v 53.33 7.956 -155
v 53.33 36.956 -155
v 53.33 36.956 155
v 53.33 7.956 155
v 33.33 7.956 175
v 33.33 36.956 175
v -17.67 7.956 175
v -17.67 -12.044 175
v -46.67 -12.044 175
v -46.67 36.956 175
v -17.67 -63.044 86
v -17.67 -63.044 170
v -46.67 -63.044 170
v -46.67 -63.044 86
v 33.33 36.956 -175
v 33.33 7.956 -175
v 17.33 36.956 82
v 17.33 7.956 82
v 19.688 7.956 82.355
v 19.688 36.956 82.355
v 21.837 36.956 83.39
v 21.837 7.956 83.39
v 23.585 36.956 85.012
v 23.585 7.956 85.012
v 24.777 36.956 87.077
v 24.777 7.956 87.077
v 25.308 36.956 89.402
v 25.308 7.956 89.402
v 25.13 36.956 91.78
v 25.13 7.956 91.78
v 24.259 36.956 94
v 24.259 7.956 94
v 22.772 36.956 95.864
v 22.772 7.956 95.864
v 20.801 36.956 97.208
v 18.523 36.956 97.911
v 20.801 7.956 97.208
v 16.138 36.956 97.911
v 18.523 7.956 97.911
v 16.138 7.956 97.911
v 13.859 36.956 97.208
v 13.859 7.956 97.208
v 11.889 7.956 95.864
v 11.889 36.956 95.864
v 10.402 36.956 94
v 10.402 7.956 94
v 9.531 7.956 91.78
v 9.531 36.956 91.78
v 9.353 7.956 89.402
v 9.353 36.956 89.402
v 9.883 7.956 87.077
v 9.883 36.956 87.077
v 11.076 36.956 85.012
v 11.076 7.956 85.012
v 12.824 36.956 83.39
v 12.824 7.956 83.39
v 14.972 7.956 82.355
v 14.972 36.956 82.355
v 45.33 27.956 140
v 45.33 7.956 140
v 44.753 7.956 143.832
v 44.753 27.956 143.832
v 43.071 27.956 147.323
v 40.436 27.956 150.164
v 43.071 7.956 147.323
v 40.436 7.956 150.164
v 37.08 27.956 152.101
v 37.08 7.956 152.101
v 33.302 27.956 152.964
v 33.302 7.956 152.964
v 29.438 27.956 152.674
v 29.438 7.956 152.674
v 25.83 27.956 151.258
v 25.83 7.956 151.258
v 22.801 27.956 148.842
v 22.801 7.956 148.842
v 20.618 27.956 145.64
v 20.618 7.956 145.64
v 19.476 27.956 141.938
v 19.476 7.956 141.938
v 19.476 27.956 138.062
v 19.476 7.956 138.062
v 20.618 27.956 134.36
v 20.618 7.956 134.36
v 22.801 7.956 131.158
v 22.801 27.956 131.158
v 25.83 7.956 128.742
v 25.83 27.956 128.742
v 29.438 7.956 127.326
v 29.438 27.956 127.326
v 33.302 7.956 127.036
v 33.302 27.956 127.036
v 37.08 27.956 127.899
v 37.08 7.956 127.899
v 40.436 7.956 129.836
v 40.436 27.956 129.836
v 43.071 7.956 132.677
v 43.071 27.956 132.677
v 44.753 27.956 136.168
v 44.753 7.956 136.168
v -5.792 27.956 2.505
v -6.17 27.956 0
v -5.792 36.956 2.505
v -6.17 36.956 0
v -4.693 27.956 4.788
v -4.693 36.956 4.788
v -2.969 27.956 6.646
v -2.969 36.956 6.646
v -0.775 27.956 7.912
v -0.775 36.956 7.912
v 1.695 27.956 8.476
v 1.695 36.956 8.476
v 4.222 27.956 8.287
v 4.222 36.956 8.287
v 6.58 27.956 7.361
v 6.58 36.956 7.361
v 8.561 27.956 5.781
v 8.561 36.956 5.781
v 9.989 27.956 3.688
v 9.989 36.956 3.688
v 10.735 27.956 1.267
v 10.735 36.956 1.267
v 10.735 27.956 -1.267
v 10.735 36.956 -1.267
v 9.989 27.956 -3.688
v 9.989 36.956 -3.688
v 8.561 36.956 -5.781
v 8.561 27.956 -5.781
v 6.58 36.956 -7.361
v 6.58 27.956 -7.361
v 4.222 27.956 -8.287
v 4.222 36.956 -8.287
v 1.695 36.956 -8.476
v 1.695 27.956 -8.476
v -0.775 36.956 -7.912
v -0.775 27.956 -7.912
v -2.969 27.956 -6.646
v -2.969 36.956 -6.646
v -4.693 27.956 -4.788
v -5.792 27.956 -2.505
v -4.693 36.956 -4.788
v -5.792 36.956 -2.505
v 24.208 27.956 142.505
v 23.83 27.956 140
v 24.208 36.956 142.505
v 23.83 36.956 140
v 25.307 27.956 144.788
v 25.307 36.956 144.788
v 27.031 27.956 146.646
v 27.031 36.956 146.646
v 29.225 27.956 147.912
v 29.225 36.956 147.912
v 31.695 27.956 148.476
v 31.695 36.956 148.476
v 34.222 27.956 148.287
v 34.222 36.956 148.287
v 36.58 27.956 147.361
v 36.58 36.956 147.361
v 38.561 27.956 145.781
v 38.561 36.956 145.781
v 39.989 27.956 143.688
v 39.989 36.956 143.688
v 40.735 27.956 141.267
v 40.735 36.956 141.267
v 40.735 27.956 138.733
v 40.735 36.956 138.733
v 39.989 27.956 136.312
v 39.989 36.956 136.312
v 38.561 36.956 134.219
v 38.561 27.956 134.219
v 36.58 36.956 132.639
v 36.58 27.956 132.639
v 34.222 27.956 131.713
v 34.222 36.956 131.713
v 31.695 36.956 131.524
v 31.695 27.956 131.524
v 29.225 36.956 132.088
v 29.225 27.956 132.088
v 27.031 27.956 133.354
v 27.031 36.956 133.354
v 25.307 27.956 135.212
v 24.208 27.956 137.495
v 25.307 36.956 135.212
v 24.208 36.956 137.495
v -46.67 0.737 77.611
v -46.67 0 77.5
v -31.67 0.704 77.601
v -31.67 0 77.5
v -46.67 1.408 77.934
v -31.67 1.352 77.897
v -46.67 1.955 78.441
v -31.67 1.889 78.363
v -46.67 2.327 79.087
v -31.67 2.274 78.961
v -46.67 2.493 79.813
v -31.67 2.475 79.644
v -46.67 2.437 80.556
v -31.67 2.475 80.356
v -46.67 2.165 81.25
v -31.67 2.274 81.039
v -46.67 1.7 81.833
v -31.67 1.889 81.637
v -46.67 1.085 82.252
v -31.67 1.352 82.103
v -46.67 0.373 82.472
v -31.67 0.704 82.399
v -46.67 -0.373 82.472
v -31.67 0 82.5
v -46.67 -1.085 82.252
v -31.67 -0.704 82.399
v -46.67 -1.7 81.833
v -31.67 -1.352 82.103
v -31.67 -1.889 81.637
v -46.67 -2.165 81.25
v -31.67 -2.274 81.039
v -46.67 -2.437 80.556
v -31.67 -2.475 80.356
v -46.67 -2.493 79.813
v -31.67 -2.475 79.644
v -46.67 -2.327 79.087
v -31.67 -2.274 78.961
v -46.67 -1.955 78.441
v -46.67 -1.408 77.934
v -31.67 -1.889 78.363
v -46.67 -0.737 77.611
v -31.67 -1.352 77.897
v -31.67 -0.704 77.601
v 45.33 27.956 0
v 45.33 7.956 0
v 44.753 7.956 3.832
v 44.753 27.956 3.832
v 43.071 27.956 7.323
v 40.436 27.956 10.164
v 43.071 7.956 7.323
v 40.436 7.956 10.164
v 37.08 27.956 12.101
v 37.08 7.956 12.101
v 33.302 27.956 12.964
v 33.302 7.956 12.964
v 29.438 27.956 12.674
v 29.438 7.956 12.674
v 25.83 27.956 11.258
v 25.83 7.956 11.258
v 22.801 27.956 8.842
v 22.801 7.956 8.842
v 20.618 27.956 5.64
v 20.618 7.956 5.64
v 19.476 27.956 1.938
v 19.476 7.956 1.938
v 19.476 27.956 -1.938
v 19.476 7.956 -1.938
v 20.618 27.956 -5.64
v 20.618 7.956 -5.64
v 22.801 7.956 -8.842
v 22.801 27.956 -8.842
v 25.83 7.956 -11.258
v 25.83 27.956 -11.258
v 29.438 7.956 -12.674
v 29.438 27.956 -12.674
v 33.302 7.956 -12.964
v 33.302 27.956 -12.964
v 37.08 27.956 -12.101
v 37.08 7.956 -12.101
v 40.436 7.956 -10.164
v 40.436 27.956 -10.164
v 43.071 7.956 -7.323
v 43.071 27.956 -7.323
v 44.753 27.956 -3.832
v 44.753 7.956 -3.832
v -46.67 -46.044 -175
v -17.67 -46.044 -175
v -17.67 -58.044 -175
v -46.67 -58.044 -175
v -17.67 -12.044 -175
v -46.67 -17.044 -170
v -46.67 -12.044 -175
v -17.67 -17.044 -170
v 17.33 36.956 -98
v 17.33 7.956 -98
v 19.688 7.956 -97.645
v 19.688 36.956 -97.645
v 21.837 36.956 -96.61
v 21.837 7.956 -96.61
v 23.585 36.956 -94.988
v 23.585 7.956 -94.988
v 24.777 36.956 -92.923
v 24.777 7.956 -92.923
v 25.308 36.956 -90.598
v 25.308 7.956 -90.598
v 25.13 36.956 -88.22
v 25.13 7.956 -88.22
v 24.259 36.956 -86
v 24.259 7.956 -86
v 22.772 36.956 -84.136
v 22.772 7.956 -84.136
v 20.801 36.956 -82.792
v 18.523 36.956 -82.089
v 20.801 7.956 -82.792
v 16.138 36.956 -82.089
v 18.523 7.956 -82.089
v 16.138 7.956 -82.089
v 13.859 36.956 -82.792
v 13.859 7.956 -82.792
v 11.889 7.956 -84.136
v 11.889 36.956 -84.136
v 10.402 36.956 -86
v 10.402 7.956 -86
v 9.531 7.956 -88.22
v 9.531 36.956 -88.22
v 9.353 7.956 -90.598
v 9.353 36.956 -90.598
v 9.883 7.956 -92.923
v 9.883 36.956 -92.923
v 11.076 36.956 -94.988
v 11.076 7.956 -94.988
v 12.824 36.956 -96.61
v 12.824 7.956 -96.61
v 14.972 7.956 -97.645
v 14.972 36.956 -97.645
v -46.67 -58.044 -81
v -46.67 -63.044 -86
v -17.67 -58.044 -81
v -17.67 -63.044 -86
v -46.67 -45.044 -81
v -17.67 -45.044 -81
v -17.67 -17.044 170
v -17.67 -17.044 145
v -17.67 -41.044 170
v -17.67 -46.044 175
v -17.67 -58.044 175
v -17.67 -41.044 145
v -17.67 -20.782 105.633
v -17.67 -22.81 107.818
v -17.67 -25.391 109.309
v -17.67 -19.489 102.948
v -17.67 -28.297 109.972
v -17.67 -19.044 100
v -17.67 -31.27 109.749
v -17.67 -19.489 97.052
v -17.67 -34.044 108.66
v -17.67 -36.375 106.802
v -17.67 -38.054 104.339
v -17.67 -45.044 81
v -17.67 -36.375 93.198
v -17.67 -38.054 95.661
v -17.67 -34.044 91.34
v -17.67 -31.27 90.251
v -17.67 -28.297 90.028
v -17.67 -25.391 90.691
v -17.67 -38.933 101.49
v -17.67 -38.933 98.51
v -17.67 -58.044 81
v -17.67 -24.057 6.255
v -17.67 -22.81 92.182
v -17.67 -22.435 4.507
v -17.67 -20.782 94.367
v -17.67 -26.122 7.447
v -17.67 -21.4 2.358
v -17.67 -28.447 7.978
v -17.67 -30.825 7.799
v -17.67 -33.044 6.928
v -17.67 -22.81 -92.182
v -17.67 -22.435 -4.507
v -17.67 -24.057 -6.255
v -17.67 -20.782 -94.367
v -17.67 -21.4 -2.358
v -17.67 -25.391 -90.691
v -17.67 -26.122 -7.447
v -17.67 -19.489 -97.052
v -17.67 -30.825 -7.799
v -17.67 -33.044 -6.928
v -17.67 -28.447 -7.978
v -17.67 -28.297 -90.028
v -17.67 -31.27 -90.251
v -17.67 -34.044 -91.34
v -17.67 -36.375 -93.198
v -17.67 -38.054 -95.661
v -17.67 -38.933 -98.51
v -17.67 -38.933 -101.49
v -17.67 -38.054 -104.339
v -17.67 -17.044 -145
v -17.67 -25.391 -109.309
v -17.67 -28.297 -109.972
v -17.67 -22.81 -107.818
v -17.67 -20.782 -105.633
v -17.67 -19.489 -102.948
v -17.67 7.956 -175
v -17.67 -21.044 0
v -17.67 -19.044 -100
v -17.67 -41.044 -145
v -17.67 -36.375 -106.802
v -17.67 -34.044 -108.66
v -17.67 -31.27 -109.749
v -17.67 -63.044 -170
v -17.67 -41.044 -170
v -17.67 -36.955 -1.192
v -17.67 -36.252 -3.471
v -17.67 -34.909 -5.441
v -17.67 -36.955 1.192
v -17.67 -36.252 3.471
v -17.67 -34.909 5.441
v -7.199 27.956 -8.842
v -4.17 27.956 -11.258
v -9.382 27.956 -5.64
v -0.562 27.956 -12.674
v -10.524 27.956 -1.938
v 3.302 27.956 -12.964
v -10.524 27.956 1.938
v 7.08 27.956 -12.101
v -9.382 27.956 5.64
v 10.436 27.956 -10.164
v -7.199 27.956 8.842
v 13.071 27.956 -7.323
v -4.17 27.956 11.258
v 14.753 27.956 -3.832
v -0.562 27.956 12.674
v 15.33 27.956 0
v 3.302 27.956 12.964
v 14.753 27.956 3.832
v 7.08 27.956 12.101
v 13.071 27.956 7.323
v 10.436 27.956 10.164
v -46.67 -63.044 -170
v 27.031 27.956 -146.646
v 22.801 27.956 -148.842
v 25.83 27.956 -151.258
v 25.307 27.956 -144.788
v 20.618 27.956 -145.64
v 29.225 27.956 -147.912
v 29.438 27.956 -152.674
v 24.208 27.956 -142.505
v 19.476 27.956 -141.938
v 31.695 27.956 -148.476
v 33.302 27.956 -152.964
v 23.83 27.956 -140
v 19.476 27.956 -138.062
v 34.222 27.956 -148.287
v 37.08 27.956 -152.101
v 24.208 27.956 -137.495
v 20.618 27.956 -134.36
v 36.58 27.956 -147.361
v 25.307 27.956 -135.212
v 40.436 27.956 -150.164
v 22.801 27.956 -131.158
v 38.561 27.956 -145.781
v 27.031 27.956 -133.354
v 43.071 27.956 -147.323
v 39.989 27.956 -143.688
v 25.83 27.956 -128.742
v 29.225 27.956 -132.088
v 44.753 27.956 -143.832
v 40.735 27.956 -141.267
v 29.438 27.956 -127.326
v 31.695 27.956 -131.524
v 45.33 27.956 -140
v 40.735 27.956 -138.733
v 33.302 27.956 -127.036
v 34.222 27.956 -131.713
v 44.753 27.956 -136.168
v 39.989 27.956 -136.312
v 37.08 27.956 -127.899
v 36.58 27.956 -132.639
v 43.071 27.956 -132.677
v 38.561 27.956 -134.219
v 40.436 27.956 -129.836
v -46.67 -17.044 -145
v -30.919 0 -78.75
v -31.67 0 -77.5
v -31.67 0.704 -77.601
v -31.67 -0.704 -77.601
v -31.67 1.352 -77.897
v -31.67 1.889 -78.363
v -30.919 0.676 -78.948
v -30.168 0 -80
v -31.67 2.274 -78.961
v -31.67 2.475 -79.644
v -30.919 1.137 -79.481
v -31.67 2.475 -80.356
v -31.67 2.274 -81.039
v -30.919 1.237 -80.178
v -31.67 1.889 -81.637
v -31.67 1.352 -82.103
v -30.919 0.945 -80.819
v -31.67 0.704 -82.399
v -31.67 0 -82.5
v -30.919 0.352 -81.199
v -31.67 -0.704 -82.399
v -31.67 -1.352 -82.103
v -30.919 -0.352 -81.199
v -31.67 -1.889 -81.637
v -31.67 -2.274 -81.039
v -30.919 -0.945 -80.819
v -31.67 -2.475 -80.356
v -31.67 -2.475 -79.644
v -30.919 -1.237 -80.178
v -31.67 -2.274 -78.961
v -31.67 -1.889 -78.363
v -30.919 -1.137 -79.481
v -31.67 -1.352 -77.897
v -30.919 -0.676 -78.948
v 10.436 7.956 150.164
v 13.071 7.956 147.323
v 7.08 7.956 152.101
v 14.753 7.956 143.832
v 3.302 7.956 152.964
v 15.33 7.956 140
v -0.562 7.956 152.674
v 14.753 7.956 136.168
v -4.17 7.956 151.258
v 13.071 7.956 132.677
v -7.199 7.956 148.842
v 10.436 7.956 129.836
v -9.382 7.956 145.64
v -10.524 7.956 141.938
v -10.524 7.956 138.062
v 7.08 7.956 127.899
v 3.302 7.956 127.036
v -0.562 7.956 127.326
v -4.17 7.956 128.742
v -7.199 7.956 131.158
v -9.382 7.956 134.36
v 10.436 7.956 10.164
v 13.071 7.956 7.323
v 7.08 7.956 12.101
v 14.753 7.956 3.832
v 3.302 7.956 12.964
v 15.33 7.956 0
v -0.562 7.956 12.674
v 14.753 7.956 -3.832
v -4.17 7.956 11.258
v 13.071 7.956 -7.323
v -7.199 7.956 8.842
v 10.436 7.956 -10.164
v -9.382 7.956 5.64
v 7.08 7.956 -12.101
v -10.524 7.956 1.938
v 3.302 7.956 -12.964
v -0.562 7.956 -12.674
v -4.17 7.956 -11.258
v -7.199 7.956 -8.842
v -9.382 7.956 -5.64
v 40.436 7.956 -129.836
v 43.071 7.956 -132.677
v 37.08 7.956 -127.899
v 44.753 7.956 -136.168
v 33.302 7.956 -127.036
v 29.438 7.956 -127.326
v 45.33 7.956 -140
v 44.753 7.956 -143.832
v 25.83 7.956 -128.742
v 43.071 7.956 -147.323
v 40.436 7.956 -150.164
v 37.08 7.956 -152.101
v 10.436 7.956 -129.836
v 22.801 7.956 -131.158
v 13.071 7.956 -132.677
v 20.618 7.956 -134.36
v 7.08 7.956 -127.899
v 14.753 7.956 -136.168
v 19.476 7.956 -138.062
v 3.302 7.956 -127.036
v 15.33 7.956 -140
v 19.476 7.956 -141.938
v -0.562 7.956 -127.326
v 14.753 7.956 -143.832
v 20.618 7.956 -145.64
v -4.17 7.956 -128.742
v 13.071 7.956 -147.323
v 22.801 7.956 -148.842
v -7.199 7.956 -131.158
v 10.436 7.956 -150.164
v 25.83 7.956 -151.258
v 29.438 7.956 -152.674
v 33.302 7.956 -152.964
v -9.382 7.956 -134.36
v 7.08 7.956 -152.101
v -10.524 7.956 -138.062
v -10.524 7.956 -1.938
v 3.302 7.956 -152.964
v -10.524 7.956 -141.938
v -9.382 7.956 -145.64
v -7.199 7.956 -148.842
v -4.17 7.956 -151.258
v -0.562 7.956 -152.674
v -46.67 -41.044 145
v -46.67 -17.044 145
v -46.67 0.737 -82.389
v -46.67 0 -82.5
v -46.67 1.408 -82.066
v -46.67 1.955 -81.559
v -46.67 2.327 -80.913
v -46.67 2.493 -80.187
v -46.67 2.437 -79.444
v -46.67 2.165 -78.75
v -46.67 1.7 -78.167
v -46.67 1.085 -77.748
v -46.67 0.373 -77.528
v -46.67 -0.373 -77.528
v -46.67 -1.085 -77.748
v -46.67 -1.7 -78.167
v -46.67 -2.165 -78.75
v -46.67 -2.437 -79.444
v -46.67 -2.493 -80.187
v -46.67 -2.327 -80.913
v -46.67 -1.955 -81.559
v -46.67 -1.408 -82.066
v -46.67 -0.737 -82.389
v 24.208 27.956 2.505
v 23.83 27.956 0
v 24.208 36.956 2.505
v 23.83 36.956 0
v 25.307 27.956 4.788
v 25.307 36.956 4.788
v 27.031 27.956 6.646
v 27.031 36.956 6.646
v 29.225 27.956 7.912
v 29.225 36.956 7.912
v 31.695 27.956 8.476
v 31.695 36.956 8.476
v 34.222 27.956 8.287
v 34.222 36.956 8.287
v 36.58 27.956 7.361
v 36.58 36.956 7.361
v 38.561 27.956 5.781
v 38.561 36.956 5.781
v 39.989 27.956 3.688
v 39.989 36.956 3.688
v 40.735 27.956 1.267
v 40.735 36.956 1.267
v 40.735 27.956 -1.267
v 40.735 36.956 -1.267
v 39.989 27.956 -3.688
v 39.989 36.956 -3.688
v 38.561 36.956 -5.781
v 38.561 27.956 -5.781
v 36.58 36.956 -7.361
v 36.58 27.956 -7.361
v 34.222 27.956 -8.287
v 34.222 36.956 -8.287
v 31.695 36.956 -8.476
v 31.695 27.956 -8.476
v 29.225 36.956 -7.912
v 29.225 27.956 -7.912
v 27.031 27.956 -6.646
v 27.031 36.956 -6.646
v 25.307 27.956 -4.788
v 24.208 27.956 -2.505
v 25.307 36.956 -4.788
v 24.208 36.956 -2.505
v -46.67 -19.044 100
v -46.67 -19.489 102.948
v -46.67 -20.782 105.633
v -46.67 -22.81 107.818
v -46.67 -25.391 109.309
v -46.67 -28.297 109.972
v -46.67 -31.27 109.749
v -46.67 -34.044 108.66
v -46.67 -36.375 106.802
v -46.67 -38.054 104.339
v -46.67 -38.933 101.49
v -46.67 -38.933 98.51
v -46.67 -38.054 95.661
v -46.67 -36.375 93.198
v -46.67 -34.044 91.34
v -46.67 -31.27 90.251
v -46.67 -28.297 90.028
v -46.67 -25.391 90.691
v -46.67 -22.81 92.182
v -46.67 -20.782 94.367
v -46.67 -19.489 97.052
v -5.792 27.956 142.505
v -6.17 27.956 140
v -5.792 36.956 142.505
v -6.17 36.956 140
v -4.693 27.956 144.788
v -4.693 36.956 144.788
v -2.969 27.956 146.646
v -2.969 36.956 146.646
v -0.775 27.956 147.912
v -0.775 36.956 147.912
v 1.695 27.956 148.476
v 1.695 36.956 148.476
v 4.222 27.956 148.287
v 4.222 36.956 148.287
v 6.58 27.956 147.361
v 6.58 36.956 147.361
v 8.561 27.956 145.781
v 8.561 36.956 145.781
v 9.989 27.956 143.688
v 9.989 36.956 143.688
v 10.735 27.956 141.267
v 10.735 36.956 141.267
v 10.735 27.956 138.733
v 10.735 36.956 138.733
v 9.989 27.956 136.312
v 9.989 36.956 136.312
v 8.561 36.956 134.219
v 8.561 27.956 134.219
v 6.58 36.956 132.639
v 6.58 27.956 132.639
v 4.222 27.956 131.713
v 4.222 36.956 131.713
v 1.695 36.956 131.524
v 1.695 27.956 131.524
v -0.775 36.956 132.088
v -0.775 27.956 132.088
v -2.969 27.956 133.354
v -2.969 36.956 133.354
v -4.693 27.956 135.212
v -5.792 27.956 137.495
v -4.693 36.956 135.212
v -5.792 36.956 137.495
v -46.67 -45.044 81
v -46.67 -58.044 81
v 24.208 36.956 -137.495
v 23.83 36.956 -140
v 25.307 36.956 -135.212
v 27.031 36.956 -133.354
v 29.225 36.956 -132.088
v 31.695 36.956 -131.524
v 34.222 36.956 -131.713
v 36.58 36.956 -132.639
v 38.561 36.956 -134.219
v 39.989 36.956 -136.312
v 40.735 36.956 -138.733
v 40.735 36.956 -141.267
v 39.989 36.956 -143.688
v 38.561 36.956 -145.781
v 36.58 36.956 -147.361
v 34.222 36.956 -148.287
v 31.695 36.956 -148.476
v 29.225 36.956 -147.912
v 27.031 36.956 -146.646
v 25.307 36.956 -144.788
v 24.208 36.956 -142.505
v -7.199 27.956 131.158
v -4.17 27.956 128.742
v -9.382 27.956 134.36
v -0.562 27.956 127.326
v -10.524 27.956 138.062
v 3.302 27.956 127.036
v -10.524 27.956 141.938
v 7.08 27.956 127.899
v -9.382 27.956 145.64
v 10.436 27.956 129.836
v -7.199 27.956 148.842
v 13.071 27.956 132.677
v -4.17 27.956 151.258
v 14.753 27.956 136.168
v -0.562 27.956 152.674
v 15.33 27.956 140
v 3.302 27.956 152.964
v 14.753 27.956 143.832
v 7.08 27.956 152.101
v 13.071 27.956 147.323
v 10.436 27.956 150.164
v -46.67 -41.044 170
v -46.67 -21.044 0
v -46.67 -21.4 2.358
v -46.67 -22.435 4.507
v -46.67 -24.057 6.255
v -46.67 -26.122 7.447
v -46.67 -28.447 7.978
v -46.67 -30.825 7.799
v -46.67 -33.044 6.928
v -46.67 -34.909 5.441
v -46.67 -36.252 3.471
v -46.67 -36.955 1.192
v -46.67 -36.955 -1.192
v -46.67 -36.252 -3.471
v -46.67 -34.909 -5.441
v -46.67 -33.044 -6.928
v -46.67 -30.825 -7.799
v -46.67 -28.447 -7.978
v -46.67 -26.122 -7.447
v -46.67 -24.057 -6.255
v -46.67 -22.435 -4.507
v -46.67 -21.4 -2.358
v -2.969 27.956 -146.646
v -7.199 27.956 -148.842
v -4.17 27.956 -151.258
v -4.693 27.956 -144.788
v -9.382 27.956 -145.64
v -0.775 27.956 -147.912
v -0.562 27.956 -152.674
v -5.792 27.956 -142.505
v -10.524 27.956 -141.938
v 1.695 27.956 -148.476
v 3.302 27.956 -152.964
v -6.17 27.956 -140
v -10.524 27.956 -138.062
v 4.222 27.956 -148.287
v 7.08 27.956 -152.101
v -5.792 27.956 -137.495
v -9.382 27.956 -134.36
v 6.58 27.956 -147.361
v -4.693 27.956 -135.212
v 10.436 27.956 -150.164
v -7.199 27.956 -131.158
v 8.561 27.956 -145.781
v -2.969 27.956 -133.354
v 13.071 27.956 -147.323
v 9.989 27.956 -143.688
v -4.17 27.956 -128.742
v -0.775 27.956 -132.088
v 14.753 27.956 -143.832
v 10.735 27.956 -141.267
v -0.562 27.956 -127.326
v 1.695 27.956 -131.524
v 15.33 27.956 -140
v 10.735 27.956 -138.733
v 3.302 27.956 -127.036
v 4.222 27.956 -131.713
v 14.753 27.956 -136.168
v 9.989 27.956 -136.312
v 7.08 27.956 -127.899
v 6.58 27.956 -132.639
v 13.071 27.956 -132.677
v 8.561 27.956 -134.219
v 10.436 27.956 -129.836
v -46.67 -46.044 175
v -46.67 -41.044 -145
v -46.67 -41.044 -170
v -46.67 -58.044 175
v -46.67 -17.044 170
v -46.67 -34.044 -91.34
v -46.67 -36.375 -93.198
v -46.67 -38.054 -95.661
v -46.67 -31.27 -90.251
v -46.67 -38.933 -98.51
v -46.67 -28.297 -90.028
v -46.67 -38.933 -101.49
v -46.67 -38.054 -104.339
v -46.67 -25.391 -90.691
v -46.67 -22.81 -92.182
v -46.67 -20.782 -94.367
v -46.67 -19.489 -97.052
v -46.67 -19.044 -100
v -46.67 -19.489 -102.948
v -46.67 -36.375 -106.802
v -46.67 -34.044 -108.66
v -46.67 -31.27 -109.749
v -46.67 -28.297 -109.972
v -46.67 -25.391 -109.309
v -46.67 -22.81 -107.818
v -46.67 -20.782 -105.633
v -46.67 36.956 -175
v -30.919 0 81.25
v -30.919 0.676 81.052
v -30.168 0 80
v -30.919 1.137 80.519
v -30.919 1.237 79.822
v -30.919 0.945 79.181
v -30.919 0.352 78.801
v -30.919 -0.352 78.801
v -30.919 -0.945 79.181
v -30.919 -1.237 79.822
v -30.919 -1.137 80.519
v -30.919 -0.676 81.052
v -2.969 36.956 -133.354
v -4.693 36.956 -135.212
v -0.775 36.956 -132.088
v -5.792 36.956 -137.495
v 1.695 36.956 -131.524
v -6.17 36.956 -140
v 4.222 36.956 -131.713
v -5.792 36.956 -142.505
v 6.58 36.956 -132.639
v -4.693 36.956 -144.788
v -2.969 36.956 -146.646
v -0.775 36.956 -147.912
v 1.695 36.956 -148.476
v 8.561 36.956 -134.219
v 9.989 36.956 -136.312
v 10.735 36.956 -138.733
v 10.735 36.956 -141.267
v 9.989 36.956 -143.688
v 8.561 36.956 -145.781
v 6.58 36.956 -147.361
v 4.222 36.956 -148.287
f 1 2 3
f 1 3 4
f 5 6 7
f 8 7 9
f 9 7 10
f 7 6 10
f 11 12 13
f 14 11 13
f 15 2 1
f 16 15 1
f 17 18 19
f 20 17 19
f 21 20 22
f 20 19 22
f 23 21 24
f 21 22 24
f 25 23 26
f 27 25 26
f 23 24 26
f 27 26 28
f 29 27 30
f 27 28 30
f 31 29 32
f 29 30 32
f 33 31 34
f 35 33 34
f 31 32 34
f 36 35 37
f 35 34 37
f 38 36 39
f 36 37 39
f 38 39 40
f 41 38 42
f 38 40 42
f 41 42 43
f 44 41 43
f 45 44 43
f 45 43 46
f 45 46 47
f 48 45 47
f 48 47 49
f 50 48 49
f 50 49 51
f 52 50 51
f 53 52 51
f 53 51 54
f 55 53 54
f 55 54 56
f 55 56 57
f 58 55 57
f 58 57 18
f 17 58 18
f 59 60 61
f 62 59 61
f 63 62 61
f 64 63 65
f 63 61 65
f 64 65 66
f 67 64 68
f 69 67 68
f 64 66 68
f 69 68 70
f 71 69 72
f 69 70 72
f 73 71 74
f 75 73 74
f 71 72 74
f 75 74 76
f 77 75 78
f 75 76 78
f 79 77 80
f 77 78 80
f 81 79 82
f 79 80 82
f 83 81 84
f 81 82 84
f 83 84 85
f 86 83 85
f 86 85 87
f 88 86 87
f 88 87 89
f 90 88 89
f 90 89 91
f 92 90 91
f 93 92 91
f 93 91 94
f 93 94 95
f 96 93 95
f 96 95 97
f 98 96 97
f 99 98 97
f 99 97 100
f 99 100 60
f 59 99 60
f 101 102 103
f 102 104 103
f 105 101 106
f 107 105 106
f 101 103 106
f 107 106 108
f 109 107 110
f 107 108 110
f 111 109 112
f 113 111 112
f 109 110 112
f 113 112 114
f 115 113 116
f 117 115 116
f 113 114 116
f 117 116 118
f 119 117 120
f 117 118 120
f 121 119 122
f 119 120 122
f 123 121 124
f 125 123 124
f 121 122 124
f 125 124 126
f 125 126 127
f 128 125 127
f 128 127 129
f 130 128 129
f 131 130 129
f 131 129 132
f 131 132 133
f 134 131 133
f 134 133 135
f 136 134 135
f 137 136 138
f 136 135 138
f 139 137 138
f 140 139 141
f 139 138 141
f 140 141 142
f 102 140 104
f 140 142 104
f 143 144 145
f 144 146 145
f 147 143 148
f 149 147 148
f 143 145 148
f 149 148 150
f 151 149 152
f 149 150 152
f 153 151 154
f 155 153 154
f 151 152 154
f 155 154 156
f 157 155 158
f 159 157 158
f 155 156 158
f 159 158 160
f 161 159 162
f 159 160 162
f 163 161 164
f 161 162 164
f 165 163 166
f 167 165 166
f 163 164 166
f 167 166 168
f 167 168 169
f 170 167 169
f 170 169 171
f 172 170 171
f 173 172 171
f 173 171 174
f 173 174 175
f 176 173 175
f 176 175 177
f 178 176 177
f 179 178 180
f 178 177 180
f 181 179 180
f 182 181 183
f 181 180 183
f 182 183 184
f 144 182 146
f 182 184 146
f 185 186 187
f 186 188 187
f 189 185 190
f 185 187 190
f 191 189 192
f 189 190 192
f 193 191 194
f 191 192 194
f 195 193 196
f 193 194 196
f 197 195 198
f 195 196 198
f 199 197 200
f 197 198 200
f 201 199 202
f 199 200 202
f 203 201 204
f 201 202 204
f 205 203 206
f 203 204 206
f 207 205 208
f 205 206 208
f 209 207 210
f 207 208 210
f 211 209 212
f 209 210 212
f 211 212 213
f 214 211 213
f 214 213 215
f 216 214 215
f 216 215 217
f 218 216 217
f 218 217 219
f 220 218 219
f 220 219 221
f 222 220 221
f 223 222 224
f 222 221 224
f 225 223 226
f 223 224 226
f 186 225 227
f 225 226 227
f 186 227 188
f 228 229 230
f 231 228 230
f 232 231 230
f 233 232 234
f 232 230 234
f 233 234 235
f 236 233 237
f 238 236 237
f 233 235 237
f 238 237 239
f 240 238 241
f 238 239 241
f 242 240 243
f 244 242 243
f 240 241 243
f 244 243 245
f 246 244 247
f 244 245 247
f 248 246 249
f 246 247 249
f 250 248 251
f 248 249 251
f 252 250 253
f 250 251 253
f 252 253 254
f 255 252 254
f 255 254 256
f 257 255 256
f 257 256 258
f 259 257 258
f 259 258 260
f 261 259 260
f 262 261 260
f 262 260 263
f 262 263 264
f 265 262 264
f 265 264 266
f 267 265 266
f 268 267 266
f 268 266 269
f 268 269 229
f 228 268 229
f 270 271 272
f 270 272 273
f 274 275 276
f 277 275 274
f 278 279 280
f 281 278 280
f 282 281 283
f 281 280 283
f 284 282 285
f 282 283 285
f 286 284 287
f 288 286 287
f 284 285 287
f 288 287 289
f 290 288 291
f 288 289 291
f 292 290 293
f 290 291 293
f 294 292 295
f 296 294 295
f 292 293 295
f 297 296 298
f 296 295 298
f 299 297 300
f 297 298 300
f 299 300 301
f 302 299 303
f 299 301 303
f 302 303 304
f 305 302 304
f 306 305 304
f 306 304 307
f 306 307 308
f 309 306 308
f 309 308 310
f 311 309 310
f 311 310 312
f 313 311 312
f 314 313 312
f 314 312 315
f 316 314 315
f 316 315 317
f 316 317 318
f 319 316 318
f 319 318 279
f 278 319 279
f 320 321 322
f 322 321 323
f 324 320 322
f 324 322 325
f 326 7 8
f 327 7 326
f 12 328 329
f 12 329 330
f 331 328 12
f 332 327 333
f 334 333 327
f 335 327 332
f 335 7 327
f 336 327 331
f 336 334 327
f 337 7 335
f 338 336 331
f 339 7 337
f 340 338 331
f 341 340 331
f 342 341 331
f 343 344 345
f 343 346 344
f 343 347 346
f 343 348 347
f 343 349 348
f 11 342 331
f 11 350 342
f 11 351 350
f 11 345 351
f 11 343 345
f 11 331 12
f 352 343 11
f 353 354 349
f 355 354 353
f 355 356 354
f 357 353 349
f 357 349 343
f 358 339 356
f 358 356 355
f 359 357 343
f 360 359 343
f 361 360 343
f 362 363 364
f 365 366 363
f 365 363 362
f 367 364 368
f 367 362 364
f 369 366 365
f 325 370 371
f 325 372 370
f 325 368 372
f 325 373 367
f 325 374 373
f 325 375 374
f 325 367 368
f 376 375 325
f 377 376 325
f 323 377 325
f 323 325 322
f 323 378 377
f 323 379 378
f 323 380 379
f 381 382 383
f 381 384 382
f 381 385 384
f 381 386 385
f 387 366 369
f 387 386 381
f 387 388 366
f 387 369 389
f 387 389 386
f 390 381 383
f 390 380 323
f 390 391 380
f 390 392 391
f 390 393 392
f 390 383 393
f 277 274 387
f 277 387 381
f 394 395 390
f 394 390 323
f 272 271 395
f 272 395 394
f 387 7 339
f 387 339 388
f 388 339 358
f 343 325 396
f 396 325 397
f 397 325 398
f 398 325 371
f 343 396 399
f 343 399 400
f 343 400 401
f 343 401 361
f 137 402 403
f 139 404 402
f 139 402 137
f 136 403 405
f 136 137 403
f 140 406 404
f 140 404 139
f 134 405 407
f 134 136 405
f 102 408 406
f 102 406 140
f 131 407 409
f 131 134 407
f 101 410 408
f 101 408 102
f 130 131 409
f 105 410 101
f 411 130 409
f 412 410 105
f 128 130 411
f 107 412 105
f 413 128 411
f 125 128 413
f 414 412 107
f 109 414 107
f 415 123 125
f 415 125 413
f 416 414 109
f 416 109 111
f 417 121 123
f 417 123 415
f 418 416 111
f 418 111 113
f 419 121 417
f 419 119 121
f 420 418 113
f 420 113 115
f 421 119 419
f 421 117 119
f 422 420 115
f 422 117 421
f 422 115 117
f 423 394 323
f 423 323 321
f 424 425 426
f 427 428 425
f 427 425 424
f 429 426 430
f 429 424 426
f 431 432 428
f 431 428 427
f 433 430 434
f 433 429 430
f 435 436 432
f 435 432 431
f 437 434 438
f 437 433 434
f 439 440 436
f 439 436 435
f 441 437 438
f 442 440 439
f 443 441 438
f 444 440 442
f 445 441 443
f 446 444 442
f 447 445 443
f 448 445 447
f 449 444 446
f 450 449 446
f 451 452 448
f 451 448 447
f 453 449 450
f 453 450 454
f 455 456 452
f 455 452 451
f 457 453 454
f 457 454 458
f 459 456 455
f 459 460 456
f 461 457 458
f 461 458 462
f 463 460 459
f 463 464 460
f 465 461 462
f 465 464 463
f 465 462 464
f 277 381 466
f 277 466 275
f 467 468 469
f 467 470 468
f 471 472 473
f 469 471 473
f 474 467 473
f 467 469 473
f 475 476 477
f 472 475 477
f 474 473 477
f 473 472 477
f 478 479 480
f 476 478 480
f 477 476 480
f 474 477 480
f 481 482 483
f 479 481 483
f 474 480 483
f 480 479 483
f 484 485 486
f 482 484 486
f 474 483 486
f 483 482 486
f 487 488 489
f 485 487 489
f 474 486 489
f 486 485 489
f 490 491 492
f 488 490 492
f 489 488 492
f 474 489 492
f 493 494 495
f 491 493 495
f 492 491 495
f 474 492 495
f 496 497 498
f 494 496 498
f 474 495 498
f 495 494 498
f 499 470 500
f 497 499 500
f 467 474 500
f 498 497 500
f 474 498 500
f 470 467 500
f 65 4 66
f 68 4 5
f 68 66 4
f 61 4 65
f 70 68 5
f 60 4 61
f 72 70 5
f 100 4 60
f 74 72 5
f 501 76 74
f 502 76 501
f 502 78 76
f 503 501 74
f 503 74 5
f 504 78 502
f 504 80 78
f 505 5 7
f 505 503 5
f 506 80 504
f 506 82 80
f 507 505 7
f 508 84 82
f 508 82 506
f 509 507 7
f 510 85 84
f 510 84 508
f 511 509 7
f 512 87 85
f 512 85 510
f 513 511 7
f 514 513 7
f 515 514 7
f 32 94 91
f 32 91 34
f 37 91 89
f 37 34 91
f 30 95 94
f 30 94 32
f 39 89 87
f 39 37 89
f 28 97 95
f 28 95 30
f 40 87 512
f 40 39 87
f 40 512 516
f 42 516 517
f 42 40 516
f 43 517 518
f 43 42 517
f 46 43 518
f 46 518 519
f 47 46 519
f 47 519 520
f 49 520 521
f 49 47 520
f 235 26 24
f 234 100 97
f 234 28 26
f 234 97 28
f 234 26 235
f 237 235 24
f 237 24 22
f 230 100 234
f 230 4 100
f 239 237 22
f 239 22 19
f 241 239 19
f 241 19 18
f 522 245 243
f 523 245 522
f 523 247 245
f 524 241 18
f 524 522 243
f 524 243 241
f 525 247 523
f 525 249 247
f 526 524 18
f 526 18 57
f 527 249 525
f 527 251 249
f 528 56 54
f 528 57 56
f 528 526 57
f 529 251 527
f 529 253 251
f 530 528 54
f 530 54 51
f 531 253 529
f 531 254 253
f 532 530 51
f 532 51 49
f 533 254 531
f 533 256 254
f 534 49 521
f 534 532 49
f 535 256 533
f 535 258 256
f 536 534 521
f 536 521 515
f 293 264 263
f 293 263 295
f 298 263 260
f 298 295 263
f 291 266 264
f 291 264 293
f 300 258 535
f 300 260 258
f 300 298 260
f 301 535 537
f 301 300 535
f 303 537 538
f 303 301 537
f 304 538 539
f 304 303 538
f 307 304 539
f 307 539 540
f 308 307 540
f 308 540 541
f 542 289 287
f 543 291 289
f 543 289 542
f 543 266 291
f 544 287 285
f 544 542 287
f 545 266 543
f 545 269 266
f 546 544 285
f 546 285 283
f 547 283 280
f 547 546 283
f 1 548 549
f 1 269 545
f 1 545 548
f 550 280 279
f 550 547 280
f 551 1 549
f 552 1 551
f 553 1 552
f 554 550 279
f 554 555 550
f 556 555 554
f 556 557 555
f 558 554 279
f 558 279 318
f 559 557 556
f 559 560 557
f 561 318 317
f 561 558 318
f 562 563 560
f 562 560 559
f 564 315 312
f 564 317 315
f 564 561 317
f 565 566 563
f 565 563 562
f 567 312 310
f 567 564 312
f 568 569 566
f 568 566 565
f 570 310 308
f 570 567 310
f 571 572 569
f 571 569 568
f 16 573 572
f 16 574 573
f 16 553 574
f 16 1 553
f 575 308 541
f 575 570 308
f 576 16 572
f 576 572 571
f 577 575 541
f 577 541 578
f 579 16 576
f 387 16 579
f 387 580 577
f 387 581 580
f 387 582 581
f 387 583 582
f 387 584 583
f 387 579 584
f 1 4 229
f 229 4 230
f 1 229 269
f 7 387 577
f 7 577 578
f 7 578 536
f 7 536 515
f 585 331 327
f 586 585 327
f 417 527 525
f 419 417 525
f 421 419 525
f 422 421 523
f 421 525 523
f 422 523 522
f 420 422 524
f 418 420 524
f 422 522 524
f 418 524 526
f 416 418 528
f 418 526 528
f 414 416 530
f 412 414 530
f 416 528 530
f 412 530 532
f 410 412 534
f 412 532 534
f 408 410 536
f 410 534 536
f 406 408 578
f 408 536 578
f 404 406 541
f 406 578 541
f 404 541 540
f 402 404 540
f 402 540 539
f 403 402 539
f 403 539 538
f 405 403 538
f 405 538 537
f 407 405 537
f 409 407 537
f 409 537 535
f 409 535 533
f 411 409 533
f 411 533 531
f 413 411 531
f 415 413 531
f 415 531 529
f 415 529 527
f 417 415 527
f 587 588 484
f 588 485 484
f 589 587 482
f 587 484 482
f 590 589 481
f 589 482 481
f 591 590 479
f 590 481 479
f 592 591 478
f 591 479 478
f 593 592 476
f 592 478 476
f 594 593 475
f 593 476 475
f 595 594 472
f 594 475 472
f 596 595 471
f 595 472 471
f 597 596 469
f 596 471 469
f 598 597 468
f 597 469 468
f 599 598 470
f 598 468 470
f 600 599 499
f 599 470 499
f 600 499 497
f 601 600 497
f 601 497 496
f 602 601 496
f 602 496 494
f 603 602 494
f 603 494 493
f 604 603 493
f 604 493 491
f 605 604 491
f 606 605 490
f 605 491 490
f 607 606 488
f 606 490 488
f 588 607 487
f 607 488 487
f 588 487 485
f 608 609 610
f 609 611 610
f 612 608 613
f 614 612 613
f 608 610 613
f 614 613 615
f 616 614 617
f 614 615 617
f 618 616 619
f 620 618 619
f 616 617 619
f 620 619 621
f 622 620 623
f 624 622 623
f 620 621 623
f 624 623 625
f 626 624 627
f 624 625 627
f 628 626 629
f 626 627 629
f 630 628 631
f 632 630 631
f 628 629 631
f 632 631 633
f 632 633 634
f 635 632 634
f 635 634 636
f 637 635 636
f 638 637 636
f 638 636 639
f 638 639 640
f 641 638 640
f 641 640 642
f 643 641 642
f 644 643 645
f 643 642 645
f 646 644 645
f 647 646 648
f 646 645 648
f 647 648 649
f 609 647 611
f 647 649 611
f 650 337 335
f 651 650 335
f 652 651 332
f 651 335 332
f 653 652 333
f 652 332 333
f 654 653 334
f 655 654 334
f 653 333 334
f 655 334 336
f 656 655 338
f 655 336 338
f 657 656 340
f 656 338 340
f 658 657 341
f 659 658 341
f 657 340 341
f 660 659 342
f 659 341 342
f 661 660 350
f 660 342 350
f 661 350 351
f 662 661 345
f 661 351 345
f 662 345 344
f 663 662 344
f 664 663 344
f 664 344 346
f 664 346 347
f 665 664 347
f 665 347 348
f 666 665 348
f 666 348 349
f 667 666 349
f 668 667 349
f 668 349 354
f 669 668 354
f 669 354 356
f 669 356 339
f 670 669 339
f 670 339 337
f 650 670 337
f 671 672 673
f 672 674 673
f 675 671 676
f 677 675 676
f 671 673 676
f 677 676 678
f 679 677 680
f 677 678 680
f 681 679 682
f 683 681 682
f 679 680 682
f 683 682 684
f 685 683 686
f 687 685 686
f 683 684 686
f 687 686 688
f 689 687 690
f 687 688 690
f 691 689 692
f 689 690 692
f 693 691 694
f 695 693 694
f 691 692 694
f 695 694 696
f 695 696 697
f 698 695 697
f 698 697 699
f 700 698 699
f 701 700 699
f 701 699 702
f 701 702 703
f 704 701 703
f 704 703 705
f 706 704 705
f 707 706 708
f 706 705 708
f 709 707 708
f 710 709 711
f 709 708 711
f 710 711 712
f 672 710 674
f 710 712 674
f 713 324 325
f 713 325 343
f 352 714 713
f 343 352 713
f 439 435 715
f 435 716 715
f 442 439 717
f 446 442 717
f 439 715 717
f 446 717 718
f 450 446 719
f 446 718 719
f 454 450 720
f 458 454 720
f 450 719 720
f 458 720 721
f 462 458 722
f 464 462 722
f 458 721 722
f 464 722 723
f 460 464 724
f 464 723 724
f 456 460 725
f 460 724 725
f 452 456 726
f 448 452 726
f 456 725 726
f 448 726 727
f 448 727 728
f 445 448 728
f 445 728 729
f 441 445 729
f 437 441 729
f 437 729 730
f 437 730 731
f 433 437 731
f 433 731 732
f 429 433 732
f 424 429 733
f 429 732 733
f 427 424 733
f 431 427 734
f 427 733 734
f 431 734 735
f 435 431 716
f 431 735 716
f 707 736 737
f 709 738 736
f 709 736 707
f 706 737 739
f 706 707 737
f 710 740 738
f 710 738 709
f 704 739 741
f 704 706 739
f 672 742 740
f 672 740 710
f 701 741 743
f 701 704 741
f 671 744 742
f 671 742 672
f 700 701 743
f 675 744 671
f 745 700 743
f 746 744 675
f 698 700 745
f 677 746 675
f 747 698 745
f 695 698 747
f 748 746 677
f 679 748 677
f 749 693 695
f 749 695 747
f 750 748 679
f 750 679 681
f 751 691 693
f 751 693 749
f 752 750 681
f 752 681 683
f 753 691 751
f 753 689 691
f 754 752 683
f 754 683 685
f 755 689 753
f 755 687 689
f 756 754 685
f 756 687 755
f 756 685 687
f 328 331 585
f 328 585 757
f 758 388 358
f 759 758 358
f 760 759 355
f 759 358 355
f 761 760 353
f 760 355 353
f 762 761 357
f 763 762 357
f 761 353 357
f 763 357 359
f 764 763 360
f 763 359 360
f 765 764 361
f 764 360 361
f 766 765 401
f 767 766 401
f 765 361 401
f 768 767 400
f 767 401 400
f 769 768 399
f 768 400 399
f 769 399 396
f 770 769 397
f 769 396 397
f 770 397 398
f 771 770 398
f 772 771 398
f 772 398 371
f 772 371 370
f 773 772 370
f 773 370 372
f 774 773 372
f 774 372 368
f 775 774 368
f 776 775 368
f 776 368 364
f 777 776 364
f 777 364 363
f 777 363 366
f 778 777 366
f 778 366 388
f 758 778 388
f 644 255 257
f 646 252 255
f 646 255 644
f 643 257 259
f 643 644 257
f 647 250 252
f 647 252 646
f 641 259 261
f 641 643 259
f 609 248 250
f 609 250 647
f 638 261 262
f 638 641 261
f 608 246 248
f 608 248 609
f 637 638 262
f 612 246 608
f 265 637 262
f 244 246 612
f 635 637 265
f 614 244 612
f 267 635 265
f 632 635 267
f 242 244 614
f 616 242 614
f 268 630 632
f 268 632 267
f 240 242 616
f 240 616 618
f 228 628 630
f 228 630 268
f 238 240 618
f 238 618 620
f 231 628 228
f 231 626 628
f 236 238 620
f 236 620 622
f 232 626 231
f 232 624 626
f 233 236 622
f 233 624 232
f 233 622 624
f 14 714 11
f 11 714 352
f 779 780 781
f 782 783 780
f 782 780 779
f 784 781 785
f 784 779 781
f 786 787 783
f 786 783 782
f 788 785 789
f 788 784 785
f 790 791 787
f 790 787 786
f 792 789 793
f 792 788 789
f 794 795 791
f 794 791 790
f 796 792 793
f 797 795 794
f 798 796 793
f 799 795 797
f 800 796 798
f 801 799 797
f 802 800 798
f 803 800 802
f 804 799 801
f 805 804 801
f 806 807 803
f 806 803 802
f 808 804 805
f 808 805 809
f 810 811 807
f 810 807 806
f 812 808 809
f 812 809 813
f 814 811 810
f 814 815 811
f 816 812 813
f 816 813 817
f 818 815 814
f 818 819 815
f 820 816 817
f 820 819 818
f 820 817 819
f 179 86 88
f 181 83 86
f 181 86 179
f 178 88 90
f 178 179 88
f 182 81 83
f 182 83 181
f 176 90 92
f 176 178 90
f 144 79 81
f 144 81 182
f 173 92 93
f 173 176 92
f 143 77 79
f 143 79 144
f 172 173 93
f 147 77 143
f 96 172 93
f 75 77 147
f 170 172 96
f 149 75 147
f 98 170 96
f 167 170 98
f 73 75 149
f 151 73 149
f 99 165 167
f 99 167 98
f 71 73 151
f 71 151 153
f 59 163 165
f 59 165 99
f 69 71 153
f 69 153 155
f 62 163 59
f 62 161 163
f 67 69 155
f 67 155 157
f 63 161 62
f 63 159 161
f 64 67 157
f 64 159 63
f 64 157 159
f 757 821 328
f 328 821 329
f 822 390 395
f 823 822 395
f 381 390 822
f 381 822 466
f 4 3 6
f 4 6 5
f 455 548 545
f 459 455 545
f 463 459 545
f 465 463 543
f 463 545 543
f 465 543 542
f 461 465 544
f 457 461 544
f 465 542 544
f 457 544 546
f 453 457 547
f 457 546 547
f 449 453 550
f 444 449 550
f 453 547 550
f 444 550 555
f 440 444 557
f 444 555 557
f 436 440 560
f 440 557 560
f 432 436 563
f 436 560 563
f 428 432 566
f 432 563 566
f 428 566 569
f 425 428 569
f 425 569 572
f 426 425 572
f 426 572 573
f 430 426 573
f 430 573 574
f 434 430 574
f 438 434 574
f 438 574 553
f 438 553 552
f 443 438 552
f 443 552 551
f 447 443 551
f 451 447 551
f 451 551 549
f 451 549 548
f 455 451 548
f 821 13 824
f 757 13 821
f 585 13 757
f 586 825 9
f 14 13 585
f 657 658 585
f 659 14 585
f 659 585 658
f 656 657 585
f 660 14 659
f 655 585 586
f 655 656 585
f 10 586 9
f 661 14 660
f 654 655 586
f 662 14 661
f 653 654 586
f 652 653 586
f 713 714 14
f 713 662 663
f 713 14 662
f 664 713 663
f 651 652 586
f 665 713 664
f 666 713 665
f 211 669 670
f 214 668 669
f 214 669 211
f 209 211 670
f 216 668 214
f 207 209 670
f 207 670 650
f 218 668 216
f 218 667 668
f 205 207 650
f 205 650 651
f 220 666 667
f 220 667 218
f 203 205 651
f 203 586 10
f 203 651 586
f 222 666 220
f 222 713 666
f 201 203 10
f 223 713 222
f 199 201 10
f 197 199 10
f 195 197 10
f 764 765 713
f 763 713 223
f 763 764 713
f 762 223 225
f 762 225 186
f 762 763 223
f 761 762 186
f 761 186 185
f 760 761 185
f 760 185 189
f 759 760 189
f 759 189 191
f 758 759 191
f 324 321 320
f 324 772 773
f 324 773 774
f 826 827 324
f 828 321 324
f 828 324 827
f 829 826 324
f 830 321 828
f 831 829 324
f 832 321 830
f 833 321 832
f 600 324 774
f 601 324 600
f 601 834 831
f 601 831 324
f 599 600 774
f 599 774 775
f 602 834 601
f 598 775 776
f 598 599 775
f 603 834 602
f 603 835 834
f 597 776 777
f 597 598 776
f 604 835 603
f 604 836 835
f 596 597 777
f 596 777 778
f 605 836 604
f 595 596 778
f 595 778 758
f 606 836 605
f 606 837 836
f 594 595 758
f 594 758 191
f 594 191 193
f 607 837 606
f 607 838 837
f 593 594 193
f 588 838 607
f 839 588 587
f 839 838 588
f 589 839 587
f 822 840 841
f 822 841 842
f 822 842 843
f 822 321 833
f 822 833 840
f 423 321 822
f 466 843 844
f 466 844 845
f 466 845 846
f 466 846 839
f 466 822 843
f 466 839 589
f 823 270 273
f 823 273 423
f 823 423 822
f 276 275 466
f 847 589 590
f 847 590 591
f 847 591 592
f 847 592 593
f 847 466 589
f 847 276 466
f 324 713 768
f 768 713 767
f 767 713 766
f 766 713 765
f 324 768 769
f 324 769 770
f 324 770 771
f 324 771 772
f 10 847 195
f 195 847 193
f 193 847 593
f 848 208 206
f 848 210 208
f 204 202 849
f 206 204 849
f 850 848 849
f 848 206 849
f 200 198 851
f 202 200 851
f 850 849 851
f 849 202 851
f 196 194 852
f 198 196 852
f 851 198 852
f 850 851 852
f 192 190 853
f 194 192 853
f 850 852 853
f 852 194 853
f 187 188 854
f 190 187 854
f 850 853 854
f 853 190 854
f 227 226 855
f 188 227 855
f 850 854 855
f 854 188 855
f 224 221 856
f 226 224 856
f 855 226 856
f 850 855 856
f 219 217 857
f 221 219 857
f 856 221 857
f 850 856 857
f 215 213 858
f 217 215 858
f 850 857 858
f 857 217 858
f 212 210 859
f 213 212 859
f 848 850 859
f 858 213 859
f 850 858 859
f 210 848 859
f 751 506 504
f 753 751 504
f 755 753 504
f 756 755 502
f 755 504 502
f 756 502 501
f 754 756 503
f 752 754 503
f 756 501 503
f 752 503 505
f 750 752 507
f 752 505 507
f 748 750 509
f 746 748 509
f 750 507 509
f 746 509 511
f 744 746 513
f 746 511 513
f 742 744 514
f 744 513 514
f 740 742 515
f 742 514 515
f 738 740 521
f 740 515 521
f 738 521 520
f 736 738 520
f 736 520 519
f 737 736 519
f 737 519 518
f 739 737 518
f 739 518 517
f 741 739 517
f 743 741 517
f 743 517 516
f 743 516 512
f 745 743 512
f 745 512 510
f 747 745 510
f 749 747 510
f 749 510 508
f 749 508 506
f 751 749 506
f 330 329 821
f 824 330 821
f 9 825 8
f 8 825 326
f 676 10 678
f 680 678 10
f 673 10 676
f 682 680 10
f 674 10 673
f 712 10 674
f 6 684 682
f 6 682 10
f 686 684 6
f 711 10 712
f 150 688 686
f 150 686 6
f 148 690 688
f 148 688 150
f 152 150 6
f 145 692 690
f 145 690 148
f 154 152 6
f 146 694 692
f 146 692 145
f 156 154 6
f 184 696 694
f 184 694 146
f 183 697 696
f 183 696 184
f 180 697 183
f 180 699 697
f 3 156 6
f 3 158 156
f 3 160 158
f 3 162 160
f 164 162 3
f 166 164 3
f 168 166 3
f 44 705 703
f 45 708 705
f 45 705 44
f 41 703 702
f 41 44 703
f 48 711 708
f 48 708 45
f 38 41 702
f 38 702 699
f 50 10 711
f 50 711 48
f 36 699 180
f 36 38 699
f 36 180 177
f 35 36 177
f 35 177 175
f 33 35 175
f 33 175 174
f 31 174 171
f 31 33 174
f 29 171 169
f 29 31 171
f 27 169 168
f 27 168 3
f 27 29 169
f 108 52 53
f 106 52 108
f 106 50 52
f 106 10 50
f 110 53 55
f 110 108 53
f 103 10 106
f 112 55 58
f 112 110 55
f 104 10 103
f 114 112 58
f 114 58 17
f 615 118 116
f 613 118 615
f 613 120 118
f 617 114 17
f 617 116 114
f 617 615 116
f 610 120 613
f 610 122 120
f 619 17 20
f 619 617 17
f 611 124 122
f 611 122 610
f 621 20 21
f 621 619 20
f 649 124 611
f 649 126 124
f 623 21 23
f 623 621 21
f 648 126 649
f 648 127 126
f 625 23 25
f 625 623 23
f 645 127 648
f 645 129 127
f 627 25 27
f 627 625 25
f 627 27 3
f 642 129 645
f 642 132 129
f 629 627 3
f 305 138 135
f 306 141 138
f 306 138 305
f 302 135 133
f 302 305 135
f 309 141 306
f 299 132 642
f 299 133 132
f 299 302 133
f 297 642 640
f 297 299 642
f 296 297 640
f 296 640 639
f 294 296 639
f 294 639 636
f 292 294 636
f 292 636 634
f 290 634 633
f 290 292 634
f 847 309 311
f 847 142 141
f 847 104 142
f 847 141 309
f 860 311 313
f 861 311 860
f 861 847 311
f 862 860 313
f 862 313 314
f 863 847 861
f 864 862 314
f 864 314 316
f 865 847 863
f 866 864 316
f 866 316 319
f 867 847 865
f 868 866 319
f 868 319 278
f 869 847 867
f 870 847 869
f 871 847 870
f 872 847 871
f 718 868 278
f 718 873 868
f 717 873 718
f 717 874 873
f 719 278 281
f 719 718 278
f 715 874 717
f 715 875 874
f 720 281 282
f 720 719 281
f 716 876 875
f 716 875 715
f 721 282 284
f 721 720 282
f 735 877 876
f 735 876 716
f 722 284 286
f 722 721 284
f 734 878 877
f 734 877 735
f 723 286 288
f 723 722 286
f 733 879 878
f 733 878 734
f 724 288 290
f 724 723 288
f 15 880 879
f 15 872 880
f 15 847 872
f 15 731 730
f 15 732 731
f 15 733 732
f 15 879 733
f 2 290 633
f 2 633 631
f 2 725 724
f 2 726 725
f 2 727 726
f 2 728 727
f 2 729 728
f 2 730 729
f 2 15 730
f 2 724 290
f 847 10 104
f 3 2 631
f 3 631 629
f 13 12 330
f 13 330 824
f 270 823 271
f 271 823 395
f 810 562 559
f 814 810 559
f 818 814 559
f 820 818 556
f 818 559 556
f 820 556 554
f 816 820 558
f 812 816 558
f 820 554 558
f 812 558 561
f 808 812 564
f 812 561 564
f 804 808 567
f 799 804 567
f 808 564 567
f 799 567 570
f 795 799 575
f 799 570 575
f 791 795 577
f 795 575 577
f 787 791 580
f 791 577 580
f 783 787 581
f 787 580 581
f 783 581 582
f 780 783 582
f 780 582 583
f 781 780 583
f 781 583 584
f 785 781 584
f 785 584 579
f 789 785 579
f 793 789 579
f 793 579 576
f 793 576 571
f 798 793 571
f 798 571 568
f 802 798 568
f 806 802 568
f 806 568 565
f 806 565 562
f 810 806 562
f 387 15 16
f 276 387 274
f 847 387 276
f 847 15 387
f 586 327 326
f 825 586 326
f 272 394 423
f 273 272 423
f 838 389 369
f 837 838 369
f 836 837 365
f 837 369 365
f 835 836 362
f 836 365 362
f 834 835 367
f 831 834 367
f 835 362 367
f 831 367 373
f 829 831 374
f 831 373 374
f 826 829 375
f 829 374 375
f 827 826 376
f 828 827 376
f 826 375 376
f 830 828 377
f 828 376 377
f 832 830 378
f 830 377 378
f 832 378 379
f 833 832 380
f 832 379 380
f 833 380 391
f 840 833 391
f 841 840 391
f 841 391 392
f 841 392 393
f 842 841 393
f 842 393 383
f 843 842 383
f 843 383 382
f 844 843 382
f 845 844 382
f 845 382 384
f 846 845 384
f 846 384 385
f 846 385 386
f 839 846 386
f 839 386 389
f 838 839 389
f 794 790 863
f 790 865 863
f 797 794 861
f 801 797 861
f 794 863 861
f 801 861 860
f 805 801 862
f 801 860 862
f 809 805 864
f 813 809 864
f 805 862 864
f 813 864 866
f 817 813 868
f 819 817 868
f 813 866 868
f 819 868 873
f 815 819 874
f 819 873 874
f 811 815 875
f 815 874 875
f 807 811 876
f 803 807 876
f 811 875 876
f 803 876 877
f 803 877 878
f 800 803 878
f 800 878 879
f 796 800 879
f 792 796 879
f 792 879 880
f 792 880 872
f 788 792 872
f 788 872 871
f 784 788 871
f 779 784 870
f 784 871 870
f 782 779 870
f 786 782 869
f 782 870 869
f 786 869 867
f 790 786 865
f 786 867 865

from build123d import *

# Parameters (mm, degrees)
EXTRUDE_1_DEPTH               = 175
EXTRUDE_1_DEPTH_BACK          = 175
SKETCH_2_W                    = 30
SKETCH_2_H                    = 24
CUT_EXTRUDE_1_DEPTH           = 212.186188109
SKETCH_3_R                    = 8
SKETCH_3_R_2                  = 10
CUT_EXTRUDE_2_DEPTH           = 200.099487814
SKETCH_4_W                    = 162
SKETCH_4_H                    = 18
CUT_EXTRUDE_3_DEPTH           = 212.186188109
SKETCH_9_R                    = 8
CUT_EXTRUDE_8_DEPTH           = 197.23996604
CHAMFER_1_SIZE                = 20
CHAMFER_2_SIZE                = 5
HOLE_WIZARD_M16_1_D           = 17
HOLE_WIZARD_M16_1_CBORE_D     = 26
HOLE_WIZARD_M16_1_CBORE_DEPTH = 20
PATTERN_LINEAR_1_COUNT        = 3
PATTERN_LINEAR_1_PITCH        = 140
PATTERN_LINEAR_1_COUNT_DIR2   = 2
PATTERN_LINEAR_1_PITCH_DIR2   = 30
M6X1_0_1_D                    = 5
M6X1_0_1_DEPTH                = 15
M6X1_0_1_TIP                  = 1.502151548


with BuildPart() as part:
    # 草图1 → 拉伸1 (new, two sides: drawn at the far end of the back side and taken through both)
    with BuildSketch(Plane.XY.offset(-EXTRUDE_1_DEPTH_BACK)):
        Polygon((-46.669668375, 36.955523256), (53.330331625, 36.955523256), (53.330331625, 7.955523256), (-17.669668375, 7.955523256), (-17.669668375, -63.044476744), (-46.669668375, -63.044476744), align=None)
    extrude(amount=EXTRUDE_1_DEPTH + EXTRUDE_1_DEPTH_BACK)

    # 草图2 → 切除-拉伸1 (cut, through all)
    with BuildSketch(Plane.ZY.offset(46.669668375)):
        with Locations((160, -29.044476744)):
            Rectangle(SKETCH_2_W, SKETCH_2_H)
    cut_extrude_1 = extrude(amount=-CUT_EXTRUDE_1_DEPTH, mode=Mode.SUBTRACT)

    # 镜向1: 切除-拉伸1 across plane
    add(cut_extrude_1.mirror(Plane.XY), mode=Mode.SUBTRACT)

    # 草图3 → 切除-拉伸2 (cut, through all)
    with BuildSketch(Plane(origin=(-17.669668375, 0, 0), x_dir=(0, 0, -1), z_dir=(1, 0, 0))):
        with Locations(Location((0, -29.044476744, 0), (0, 0, 90))):
            Circle(SKETCH_3_R)
        with Locations(Location((100, -29.044476744, 0), (0, 0, 90))):
            Circle(SKETCH_3_R_2)
        with Locations(Location((-100, -29.044476744, 0), (0, 0, 90))):
            Circle(SKETCH_3_R_2)
    extrude(amount=-CUT_EXTRUDE_2_DEPTH, mode=Mode.SUBTRACT)

    # 草图4 → 切除-拉伸3 (cut, through all)
    with BuildSketch(Plane.ZY.offset(46.669668375)):
        with Locations((0, -54.044476744)):
            Rectangle(SKETCH_4_W, SKETCH_4_H)
    extrude(amount=-CUT_EXTRUDE_3_DEPTH, mode=Mode.SUBTRACT)

    # 草图9 → 切除-拉伸8 (cut, through all)
    with BuildSketch(Plane.XZ.offset(-7.955523256)):
        with Locations(Location((17.330331625, -90, 0), (0, 0, 270))):
            Circle(SKETCH_9_R)
        with Locations(Location((17.330331625, 90, 0), (0, 0, 270))):
            Circle(SKETCH_9_R)
    extrude(amount=-CUT_EXTRUDE_8_DEPTH, mode=Mode.SUBTRACT)

    # 倒角1
    chamfer_1_edges = [part.edges().sort_by_distance(p)[0] for p in [
        (53.330331625, 22.455523256, -175),
        (53.330331625, 22.455523256, 175),
    ]]
    chamfer(chamfer_1_edges, length=CHAMFER_1_SIZE)

    # 倒角2
    chamfer_2_edges = [part.edges().sort_by_distance(p)[0] for p in [
        (-32.169668375, -63.044476744, 175),
        (-32.169668375, -63.044476744, -175),
        (-32.169668375, -17.044476744, 175),
        (-32.169668375, -41.044476744, 175),
        (-32.169668375, -41.044476744, -175),
        (-32.169668375, -17.044476744, -175),
        (-32.169668375, -63.044476744, -81),
        (-32.169668375, -63.044476744, 81),
    ]]
    chamfer(chamfer_2_edges, length=CHAMFER_2_SIZE)

    # M16 六角凹头螺钉的柱形沉头孔1 (through all)
    with Locations(Plane.XZ.offset(-7.955523256)):
        with Locations((2.330331625, -140)):
            hole_wizard_m16_1 = CounterBoreHole(HOLE_WIZARD_M16_1_D / 2, HOLE_WIZARD_M16_1_CBORE_D / 2, HOLE_WIZARD_M16_1_CBORE_DEPTH)

    # 阵列(线性)1: Hole Wizard M16 _1 3 × 2
    with Locations(*[(j * PATTERN_LINEAR_1_PITCH_DIR2, 0, i * PATTERN_LINEAR_1_PITCH) for i in range(PATTERN_LINEAR_1_COUNT) for j in range(PATTERN_LINEAR_1_COUNT_DIR2) if (i, j) != (0, 0)]):
        add(hole_wizard_m16_1, mode=Mode.SUBTRACT)

    # M6x1.0 螺纹孔1
    with Locations(Plane.ZY.offset(46.669668375)):
        with Locations((80, 0), (-80, 0)):
            Hole(M6X1_0_1_D / 2, depth=M6X1_0_1_DEPTH)
            with Locations((0, 0, -(M6X1_0_1_DEPTH + M6X1_0_1_TIP / 2))):  # 118° drill point
                Cone(0, M6X1_0_1_D / 2, M6X1_0_1_TIP, mode=Mode.SUBTRACT)


solid = part.part
